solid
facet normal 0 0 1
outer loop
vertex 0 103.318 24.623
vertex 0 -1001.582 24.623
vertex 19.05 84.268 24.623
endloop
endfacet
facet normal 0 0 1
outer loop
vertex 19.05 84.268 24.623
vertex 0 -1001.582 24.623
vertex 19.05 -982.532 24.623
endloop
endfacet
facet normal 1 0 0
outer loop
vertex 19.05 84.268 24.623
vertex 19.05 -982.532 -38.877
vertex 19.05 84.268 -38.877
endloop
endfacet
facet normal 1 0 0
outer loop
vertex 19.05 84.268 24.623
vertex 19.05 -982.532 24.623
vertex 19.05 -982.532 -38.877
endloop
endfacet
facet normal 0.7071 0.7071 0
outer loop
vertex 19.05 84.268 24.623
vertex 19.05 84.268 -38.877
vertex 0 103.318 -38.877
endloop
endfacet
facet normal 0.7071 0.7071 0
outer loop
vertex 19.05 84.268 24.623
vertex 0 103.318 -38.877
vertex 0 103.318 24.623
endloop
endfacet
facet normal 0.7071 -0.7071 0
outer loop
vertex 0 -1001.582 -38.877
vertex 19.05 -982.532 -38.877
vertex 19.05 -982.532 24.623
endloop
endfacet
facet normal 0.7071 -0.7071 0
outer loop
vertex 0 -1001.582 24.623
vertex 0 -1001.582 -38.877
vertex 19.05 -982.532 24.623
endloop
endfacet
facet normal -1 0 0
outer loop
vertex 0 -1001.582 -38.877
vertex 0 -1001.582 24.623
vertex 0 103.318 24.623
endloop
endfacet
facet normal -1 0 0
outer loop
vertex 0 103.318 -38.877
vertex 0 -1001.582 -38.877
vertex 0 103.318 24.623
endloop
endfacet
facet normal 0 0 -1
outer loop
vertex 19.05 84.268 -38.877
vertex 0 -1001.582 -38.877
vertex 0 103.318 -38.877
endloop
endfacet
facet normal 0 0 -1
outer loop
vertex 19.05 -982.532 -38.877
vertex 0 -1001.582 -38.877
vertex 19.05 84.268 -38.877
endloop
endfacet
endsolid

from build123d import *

# Parameters (mm, degrees)
F0_W     = 1104.9
F0_H     = 63.5
F1_DEPTH = 19.05
F2_SIZE  = 19.04999


# Not quite as in the source:
# - a fillet or chamfer is up to 0.001 mm smaller than in the source, because OpenCascade refuses the exact size


with BuildPart() as f1:
    # F0 (on Right) → F1 (new body)
    with BuildSketch(Plane.YZ):
        with Locations((-449.1316961765, -7.1268278062)):
            Rectangle(F0_W, F0_H)
    extrude(amount=F1_DEPTH)

    # F2 (size 19.05 in the source; OpenCascade refuses exactly that, so slightly less here)
    f2_edges = [f1.edges().sort_by_distance(p)[0] for p in [
        (19.05, -1001.581696, -7.126828),
        (19.05, 103.318304, -7.126828),
    ]]
    chamfer(f2_edges, length=F2_SIZE)


solid = f1.part
